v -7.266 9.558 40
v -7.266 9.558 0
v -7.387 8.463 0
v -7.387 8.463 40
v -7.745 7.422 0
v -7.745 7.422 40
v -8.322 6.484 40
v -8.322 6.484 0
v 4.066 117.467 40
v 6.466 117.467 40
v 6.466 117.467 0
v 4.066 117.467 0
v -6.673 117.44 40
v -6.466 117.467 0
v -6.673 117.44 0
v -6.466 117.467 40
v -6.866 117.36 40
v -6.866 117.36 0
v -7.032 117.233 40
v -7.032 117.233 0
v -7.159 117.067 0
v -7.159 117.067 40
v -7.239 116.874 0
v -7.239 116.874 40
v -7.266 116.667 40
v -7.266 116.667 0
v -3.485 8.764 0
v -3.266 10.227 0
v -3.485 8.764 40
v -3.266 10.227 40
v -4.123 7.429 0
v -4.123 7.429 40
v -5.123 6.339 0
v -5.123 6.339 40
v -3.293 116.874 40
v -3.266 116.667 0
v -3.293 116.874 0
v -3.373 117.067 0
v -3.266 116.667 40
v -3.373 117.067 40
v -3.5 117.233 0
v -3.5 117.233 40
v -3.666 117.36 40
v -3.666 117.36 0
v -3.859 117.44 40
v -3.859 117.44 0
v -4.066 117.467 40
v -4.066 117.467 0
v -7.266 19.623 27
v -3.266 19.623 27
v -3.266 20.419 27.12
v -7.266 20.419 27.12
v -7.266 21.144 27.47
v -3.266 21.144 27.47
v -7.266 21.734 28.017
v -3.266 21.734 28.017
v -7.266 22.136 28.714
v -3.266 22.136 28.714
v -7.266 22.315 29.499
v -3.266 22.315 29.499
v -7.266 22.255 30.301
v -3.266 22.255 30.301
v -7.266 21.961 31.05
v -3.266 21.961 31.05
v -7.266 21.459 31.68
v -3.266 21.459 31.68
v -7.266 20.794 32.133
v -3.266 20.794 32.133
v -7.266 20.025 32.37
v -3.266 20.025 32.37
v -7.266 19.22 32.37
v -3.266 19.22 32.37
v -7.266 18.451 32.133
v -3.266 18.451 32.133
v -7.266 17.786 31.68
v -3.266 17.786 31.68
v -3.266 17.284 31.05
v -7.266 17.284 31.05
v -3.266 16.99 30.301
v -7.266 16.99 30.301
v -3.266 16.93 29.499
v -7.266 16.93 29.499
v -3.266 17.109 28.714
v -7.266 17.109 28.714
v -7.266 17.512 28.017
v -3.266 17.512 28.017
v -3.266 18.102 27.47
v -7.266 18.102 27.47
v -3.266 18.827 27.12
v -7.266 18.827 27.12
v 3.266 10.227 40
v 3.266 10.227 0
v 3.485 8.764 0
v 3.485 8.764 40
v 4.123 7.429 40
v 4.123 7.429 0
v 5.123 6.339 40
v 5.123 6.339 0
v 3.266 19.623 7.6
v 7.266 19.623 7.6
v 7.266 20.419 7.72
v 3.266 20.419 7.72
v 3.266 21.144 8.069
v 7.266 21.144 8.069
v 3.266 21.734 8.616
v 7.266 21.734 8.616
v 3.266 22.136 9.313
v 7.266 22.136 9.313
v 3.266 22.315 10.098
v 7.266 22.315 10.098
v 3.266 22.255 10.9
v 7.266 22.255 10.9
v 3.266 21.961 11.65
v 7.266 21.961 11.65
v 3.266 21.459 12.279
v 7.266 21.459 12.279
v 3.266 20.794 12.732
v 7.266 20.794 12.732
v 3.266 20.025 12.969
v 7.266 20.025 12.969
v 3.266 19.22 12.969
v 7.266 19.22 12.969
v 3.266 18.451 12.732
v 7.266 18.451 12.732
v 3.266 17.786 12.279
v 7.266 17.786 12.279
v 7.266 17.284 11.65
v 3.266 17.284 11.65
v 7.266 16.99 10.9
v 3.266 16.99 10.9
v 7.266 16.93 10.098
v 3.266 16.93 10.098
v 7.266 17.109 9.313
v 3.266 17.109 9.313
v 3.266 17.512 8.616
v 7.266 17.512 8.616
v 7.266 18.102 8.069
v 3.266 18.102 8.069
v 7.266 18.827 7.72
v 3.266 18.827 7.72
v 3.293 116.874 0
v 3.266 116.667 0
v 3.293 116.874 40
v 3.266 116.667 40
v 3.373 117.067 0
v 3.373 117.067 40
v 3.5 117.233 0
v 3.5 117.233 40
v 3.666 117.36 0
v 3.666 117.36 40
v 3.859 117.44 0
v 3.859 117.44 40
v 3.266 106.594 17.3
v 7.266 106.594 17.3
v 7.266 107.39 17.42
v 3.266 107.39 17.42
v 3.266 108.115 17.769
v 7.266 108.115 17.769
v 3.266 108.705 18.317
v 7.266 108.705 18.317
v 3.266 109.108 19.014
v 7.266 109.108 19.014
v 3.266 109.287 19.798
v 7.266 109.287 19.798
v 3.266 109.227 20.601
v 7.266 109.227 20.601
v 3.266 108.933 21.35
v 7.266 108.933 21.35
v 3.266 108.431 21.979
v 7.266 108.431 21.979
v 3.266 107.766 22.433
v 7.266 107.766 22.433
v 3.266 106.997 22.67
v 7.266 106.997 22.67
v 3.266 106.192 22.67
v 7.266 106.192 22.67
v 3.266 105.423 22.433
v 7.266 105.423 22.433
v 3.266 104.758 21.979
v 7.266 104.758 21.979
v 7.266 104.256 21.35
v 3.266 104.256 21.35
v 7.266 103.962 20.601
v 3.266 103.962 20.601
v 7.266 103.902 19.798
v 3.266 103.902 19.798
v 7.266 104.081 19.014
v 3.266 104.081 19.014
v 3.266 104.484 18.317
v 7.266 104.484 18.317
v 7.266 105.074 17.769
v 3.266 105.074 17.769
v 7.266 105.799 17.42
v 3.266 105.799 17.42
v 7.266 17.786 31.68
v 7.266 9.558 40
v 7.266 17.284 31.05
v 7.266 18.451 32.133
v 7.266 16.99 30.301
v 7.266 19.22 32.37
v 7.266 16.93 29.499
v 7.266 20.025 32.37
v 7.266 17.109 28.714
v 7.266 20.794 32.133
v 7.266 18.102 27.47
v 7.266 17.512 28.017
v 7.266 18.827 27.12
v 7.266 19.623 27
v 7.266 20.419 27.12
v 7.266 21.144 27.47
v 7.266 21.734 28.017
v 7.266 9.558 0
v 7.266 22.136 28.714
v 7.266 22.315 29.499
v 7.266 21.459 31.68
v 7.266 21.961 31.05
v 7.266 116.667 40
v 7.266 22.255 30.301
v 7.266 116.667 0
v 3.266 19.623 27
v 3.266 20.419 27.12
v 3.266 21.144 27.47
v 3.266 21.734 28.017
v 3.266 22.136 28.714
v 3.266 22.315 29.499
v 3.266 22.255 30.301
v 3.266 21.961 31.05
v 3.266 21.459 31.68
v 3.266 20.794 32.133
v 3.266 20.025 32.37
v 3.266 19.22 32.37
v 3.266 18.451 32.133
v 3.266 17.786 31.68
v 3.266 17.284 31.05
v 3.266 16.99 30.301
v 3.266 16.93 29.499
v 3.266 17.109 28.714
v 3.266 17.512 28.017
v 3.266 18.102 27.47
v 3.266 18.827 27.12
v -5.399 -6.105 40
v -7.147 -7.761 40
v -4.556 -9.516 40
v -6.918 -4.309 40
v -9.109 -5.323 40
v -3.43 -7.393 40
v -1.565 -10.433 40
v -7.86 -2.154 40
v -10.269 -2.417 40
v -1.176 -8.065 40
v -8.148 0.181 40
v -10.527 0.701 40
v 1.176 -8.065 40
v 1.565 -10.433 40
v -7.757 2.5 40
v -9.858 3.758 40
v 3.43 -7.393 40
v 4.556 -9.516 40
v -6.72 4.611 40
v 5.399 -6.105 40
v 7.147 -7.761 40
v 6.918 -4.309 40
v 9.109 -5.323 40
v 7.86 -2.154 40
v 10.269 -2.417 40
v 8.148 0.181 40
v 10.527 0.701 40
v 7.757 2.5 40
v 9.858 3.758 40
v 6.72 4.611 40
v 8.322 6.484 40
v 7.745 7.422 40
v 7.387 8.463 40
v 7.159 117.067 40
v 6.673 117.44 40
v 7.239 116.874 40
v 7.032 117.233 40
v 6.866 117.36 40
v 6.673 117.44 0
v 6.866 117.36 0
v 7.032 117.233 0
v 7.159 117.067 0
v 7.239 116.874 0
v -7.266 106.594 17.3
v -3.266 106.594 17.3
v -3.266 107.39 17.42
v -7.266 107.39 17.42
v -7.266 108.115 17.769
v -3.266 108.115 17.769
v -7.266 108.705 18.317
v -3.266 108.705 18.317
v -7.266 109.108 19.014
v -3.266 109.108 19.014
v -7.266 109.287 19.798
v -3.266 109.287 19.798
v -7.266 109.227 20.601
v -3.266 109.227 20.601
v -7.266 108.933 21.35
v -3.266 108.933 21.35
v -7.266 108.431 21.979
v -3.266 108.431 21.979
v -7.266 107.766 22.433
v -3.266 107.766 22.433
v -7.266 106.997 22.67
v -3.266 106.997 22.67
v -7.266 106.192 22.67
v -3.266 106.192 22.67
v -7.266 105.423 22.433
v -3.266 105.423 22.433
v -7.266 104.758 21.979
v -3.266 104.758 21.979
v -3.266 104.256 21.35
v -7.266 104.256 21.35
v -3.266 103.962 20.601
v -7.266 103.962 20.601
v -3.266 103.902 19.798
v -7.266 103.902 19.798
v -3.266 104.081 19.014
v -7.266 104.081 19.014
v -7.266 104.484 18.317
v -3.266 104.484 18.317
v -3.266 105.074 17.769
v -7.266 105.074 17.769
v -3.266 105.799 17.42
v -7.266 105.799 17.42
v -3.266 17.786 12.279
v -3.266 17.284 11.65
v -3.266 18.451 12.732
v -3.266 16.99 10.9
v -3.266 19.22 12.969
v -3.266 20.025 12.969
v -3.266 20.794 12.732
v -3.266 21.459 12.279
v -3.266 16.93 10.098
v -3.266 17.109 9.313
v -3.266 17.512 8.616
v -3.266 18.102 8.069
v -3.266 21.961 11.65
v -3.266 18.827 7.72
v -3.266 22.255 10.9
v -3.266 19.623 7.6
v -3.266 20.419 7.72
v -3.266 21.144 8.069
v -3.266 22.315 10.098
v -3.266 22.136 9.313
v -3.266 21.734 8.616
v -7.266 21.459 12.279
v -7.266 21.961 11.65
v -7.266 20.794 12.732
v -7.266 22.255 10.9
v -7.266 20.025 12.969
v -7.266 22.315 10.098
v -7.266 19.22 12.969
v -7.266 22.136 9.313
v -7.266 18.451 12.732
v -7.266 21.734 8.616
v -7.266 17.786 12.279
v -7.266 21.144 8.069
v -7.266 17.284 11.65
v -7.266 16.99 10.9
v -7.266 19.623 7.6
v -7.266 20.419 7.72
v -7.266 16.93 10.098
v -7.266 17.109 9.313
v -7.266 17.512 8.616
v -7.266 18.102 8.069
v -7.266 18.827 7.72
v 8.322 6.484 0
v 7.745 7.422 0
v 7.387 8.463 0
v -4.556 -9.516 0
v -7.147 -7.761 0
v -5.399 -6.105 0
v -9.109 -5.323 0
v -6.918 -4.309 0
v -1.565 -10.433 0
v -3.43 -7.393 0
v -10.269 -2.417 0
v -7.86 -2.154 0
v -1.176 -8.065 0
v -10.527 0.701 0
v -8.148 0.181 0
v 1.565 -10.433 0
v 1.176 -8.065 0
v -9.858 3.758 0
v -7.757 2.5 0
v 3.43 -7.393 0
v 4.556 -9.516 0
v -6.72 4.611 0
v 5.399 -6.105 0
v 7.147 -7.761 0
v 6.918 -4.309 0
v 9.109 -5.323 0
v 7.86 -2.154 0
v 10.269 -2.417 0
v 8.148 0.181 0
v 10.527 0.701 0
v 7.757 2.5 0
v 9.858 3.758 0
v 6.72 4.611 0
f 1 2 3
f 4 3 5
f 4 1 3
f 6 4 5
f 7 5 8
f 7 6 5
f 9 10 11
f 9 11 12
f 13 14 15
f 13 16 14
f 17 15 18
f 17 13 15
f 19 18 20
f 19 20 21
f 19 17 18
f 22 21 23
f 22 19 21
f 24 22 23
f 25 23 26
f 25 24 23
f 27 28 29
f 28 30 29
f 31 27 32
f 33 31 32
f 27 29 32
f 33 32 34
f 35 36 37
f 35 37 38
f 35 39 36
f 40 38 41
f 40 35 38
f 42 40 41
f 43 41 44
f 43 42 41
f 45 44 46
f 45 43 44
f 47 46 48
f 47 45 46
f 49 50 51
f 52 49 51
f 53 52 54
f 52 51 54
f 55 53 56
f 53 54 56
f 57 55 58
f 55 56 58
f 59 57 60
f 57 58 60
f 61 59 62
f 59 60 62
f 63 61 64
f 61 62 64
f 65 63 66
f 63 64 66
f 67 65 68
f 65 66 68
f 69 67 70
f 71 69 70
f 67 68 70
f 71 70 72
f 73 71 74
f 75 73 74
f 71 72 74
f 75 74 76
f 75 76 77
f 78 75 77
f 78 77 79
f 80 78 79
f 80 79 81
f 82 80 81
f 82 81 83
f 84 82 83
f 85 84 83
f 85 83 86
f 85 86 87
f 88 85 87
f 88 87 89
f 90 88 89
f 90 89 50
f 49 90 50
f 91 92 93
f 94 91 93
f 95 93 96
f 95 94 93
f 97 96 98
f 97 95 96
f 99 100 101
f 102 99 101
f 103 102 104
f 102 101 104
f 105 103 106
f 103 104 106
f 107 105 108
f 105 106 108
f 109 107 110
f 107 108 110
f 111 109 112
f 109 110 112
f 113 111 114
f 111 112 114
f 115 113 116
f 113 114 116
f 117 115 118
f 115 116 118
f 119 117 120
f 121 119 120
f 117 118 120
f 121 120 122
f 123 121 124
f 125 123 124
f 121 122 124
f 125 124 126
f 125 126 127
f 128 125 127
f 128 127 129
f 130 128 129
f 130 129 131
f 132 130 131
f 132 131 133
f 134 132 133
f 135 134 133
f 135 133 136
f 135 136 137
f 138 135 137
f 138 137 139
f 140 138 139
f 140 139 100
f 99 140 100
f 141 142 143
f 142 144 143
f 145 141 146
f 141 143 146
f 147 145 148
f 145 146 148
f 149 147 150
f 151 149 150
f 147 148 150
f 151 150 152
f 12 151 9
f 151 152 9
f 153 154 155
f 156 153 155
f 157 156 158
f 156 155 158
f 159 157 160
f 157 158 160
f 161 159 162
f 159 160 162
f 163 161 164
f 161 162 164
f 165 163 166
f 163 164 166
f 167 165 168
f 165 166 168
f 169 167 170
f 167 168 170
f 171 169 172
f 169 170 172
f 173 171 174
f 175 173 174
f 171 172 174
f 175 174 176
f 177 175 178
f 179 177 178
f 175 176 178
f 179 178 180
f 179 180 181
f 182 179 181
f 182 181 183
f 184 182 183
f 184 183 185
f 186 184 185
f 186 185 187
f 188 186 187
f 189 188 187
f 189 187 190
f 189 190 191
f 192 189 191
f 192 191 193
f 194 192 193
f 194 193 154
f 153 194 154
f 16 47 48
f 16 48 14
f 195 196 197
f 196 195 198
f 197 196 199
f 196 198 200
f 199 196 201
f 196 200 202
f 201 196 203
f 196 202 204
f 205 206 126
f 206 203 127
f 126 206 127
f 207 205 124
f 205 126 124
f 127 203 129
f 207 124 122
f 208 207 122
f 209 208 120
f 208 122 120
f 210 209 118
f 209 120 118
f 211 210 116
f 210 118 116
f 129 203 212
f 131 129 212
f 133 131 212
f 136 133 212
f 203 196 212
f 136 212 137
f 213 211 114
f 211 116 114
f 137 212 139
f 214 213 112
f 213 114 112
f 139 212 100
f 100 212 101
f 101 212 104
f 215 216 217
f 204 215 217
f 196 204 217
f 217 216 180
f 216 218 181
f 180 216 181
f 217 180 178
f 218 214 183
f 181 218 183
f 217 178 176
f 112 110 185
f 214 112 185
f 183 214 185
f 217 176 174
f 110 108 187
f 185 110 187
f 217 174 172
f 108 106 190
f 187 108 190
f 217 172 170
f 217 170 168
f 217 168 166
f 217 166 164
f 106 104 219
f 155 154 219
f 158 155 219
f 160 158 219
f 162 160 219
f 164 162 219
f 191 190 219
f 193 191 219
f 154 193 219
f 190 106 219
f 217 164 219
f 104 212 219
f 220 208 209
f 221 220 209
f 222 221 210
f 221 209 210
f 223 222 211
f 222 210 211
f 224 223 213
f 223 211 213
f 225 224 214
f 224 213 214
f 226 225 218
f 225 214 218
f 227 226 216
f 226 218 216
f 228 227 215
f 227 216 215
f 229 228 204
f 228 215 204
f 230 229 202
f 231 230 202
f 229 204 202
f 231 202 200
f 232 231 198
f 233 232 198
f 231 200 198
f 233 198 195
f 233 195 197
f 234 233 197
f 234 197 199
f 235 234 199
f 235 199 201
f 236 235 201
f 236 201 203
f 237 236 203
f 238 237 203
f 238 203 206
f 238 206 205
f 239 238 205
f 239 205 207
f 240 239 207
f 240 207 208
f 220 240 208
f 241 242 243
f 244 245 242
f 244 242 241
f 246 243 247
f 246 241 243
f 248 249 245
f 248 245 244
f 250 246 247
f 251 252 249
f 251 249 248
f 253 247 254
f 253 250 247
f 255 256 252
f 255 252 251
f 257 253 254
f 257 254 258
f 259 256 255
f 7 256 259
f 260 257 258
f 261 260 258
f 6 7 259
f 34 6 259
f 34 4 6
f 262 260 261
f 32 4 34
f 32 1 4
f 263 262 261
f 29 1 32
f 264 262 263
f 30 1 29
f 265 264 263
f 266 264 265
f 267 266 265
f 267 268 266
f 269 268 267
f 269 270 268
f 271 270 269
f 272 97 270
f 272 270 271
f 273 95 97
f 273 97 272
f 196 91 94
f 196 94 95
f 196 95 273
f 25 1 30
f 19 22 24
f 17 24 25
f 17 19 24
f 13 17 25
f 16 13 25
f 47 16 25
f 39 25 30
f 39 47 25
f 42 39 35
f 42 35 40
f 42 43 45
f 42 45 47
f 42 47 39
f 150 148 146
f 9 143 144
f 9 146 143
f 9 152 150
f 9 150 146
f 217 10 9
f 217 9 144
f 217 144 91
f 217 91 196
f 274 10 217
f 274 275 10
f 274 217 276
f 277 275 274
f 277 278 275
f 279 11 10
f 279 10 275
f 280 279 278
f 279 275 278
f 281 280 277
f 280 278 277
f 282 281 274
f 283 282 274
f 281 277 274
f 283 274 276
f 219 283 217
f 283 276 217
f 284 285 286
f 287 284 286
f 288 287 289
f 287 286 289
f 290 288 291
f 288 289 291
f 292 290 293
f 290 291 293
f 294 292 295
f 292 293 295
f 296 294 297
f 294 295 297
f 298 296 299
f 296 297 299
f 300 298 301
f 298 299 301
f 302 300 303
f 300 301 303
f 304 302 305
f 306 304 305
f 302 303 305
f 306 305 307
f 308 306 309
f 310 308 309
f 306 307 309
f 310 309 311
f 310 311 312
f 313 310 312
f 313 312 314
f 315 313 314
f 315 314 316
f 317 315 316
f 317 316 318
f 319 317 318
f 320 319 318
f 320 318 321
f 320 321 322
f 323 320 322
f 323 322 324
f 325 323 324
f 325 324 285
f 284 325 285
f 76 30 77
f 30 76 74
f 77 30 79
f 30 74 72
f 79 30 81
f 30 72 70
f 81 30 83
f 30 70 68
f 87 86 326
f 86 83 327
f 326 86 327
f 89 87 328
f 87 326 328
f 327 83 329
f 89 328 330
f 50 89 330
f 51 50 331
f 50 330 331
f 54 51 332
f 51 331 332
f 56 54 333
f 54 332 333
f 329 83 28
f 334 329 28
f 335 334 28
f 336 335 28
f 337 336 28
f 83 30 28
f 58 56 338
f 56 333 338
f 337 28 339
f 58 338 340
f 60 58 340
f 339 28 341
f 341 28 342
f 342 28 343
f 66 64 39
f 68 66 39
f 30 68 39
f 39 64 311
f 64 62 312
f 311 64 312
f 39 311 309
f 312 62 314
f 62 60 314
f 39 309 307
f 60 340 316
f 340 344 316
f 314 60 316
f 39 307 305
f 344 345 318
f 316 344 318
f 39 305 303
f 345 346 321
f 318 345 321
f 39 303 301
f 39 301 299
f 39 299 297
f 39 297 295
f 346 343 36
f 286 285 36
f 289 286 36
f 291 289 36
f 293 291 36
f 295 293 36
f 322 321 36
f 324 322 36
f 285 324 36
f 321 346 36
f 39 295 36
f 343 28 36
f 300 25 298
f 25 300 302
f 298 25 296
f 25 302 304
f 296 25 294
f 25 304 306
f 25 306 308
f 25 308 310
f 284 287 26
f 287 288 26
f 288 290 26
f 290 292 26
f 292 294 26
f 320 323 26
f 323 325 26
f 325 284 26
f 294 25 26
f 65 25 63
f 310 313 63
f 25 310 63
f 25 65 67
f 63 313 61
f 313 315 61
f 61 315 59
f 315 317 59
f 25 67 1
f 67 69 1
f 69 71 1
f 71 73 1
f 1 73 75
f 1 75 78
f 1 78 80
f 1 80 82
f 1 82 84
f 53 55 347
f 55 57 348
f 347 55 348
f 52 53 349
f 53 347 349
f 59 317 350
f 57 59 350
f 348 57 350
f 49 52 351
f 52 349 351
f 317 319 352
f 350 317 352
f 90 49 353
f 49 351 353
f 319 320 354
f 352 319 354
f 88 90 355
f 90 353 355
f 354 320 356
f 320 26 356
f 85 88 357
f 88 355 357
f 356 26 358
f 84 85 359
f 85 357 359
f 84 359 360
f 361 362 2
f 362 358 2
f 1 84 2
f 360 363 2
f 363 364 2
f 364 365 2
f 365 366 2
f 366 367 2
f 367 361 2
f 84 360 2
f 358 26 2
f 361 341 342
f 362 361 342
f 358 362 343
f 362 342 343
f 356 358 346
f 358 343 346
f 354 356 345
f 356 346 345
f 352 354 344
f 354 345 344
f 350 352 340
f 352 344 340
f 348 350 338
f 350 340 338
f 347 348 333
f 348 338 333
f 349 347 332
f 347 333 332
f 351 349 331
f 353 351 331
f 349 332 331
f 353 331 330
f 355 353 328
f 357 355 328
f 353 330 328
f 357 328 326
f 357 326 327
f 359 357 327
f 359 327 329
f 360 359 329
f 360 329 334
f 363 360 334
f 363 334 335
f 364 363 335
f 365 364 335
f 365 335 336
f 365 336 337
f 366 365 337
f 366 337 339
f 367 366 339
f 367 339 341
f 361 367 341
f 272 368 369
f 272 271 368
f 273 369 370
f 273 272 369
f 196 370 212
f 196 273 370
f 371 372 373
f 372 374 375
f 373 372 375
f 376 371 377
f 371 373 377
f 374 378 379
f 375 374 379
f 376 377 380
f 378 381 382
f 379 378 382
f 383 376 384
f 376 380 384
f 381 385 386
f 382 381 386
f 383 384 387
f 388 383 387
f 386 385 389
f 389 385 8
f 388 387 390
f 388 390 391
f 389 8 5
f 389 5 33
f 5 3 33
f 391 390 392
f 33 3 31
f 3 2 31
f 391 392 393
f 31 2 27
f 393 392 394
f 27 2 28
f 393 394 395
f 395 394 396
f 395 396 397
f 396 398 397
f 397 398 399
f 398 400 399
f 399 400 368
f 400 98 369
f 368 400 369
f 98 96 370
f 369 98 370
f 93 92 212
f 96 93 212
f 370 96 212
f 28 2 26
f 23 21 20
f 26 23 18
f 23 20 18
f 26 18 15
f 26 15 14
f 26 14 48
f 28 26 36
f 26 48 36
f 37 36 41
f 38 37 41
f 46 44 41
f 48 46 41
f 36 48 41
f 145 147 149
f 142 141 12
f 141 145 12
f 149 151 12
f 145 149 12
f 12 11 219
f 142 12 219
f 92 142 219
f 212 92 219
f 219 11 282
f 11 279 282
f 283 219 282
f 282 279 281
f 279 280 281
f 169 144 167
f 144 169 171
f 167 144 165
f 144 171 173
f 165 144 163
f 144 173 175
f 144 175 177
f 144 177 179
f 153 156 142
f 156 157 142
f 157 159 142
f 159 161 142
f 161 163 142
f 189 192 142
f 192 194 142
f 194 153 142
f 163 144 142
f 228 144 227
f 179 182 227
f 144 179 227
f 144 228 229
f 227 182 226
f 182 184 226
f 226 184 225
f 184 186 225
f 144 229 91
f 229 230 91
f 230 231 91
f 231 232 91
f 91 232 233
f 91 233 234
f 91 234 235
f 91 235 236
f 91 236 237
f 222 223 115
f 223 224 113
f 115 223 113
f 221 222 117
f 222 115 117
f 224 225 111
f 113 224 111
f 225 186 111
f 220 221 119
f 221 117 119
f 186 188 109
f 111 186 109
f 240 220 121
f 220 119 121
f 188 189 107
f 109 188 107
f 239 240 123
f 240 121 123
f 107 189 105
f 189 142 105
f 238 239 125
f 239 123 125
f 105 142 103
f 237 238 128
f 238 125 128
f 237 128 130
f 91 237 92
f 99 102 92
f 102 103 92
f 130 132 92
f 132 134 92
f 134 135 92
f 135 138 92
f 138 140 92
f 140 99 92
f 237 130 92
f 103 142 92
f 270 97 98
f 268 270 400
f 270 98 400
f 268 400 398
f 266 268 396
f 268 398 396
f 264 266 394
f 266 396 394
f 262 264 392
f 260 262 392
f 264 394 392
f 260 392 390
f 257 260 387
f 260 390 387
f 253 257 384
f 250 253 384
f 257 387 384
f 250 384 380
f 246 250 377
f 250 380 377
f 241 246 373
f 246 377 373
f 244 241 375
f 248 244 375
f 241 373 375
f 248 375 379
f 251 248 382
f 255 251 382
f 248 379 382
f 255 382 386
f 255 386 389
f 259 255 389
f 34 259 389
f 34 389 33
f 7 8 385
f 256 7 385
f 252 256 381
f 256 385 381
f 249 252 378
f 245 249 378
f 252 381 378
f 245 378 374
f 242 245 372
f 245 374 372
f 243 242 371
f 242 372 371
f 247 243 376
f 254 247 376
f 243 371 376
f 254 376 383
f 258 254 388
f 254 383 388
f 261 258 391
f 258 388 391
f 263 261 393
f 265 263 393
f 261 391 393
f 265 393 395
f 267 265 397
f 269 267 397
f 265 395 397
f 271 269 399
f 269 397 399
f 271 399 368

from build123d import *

# Parameters (mm, degrees)
BOSS_EXTRU_1_DEPTH = 40
CONG_1_R           = 5
CONG_2_R           = 0.8
D_GAGEMENT_M1_61_D = 5.4


with BuildPart() as part:
    # Esquisse1 → Boss.-Extru.1 (new body)
    with BuildSketch(Plane.XY):
        with BuildLine():
            Line((-3.266012474, 7.466971442), (-3.266012474, 117.466971442))
            Line((-3.266012474, 117.466971442), (-7.266012474, 117.466971442))
            Line((-7.266012474, 117.466971442), (-7.266012474, 7.649023646))
            ThreePointArc((-7.266012474, 7.649023646), (0, -10.55), (7.266012474, 7.649023646))
            Line((7.266012474, 7.649023646), (7.266012474, 117.466971442))
            Line((7.266012474, 117.466971442), (3.266012474, 117.466971442))
            Line((3.266012474, 117.466971442), (3.266012474, 7.466971442))
            ThreePointArc((3.266012474, 7.466971442), (0, -8.15), (-3.266012474, 7.466971442))
        make_face()
    extrude(amount=BOSS_EXTRU_1_DEPTH)

    # Congé1
    cong_1_edges = [part.edges().sort_by_distance(p)[0] for p in [
        (7.266012474, 7.649023646, 20),
        (-7.266012474, 7.649023646, 20),
        (-3.266012474, 7.466971442, 20),
        (3.266012474, 7.466971442, 20),
    ]]
    fillet(cong_1_edges, radius=CONG_1_R)

    # Congé2
    cong_2_edges = [part.edges().sort_by_distance(p)[0] for p in [
        (3.266012474, 117.466971442, 20),
        (7.266012474, 117.466971442, 20),
        (-7.266012474, 117.466971442, 20),
        (-3.266012474, 117.466971442, 20),
    ]]
    fillet(cong_2_edges, radius=CONG_2_R)

    # Dégagement M1.61 (through all)
    with Locations(Plane.ZY.offset(7.266012474)):
        with Locations((20, 106.594477776), (10.299577014, 19.622753657), (29.700422986, 19.622753657)):
            Hole(D_GAGEMENT_M1_61_D / 2)


solid = part.part
